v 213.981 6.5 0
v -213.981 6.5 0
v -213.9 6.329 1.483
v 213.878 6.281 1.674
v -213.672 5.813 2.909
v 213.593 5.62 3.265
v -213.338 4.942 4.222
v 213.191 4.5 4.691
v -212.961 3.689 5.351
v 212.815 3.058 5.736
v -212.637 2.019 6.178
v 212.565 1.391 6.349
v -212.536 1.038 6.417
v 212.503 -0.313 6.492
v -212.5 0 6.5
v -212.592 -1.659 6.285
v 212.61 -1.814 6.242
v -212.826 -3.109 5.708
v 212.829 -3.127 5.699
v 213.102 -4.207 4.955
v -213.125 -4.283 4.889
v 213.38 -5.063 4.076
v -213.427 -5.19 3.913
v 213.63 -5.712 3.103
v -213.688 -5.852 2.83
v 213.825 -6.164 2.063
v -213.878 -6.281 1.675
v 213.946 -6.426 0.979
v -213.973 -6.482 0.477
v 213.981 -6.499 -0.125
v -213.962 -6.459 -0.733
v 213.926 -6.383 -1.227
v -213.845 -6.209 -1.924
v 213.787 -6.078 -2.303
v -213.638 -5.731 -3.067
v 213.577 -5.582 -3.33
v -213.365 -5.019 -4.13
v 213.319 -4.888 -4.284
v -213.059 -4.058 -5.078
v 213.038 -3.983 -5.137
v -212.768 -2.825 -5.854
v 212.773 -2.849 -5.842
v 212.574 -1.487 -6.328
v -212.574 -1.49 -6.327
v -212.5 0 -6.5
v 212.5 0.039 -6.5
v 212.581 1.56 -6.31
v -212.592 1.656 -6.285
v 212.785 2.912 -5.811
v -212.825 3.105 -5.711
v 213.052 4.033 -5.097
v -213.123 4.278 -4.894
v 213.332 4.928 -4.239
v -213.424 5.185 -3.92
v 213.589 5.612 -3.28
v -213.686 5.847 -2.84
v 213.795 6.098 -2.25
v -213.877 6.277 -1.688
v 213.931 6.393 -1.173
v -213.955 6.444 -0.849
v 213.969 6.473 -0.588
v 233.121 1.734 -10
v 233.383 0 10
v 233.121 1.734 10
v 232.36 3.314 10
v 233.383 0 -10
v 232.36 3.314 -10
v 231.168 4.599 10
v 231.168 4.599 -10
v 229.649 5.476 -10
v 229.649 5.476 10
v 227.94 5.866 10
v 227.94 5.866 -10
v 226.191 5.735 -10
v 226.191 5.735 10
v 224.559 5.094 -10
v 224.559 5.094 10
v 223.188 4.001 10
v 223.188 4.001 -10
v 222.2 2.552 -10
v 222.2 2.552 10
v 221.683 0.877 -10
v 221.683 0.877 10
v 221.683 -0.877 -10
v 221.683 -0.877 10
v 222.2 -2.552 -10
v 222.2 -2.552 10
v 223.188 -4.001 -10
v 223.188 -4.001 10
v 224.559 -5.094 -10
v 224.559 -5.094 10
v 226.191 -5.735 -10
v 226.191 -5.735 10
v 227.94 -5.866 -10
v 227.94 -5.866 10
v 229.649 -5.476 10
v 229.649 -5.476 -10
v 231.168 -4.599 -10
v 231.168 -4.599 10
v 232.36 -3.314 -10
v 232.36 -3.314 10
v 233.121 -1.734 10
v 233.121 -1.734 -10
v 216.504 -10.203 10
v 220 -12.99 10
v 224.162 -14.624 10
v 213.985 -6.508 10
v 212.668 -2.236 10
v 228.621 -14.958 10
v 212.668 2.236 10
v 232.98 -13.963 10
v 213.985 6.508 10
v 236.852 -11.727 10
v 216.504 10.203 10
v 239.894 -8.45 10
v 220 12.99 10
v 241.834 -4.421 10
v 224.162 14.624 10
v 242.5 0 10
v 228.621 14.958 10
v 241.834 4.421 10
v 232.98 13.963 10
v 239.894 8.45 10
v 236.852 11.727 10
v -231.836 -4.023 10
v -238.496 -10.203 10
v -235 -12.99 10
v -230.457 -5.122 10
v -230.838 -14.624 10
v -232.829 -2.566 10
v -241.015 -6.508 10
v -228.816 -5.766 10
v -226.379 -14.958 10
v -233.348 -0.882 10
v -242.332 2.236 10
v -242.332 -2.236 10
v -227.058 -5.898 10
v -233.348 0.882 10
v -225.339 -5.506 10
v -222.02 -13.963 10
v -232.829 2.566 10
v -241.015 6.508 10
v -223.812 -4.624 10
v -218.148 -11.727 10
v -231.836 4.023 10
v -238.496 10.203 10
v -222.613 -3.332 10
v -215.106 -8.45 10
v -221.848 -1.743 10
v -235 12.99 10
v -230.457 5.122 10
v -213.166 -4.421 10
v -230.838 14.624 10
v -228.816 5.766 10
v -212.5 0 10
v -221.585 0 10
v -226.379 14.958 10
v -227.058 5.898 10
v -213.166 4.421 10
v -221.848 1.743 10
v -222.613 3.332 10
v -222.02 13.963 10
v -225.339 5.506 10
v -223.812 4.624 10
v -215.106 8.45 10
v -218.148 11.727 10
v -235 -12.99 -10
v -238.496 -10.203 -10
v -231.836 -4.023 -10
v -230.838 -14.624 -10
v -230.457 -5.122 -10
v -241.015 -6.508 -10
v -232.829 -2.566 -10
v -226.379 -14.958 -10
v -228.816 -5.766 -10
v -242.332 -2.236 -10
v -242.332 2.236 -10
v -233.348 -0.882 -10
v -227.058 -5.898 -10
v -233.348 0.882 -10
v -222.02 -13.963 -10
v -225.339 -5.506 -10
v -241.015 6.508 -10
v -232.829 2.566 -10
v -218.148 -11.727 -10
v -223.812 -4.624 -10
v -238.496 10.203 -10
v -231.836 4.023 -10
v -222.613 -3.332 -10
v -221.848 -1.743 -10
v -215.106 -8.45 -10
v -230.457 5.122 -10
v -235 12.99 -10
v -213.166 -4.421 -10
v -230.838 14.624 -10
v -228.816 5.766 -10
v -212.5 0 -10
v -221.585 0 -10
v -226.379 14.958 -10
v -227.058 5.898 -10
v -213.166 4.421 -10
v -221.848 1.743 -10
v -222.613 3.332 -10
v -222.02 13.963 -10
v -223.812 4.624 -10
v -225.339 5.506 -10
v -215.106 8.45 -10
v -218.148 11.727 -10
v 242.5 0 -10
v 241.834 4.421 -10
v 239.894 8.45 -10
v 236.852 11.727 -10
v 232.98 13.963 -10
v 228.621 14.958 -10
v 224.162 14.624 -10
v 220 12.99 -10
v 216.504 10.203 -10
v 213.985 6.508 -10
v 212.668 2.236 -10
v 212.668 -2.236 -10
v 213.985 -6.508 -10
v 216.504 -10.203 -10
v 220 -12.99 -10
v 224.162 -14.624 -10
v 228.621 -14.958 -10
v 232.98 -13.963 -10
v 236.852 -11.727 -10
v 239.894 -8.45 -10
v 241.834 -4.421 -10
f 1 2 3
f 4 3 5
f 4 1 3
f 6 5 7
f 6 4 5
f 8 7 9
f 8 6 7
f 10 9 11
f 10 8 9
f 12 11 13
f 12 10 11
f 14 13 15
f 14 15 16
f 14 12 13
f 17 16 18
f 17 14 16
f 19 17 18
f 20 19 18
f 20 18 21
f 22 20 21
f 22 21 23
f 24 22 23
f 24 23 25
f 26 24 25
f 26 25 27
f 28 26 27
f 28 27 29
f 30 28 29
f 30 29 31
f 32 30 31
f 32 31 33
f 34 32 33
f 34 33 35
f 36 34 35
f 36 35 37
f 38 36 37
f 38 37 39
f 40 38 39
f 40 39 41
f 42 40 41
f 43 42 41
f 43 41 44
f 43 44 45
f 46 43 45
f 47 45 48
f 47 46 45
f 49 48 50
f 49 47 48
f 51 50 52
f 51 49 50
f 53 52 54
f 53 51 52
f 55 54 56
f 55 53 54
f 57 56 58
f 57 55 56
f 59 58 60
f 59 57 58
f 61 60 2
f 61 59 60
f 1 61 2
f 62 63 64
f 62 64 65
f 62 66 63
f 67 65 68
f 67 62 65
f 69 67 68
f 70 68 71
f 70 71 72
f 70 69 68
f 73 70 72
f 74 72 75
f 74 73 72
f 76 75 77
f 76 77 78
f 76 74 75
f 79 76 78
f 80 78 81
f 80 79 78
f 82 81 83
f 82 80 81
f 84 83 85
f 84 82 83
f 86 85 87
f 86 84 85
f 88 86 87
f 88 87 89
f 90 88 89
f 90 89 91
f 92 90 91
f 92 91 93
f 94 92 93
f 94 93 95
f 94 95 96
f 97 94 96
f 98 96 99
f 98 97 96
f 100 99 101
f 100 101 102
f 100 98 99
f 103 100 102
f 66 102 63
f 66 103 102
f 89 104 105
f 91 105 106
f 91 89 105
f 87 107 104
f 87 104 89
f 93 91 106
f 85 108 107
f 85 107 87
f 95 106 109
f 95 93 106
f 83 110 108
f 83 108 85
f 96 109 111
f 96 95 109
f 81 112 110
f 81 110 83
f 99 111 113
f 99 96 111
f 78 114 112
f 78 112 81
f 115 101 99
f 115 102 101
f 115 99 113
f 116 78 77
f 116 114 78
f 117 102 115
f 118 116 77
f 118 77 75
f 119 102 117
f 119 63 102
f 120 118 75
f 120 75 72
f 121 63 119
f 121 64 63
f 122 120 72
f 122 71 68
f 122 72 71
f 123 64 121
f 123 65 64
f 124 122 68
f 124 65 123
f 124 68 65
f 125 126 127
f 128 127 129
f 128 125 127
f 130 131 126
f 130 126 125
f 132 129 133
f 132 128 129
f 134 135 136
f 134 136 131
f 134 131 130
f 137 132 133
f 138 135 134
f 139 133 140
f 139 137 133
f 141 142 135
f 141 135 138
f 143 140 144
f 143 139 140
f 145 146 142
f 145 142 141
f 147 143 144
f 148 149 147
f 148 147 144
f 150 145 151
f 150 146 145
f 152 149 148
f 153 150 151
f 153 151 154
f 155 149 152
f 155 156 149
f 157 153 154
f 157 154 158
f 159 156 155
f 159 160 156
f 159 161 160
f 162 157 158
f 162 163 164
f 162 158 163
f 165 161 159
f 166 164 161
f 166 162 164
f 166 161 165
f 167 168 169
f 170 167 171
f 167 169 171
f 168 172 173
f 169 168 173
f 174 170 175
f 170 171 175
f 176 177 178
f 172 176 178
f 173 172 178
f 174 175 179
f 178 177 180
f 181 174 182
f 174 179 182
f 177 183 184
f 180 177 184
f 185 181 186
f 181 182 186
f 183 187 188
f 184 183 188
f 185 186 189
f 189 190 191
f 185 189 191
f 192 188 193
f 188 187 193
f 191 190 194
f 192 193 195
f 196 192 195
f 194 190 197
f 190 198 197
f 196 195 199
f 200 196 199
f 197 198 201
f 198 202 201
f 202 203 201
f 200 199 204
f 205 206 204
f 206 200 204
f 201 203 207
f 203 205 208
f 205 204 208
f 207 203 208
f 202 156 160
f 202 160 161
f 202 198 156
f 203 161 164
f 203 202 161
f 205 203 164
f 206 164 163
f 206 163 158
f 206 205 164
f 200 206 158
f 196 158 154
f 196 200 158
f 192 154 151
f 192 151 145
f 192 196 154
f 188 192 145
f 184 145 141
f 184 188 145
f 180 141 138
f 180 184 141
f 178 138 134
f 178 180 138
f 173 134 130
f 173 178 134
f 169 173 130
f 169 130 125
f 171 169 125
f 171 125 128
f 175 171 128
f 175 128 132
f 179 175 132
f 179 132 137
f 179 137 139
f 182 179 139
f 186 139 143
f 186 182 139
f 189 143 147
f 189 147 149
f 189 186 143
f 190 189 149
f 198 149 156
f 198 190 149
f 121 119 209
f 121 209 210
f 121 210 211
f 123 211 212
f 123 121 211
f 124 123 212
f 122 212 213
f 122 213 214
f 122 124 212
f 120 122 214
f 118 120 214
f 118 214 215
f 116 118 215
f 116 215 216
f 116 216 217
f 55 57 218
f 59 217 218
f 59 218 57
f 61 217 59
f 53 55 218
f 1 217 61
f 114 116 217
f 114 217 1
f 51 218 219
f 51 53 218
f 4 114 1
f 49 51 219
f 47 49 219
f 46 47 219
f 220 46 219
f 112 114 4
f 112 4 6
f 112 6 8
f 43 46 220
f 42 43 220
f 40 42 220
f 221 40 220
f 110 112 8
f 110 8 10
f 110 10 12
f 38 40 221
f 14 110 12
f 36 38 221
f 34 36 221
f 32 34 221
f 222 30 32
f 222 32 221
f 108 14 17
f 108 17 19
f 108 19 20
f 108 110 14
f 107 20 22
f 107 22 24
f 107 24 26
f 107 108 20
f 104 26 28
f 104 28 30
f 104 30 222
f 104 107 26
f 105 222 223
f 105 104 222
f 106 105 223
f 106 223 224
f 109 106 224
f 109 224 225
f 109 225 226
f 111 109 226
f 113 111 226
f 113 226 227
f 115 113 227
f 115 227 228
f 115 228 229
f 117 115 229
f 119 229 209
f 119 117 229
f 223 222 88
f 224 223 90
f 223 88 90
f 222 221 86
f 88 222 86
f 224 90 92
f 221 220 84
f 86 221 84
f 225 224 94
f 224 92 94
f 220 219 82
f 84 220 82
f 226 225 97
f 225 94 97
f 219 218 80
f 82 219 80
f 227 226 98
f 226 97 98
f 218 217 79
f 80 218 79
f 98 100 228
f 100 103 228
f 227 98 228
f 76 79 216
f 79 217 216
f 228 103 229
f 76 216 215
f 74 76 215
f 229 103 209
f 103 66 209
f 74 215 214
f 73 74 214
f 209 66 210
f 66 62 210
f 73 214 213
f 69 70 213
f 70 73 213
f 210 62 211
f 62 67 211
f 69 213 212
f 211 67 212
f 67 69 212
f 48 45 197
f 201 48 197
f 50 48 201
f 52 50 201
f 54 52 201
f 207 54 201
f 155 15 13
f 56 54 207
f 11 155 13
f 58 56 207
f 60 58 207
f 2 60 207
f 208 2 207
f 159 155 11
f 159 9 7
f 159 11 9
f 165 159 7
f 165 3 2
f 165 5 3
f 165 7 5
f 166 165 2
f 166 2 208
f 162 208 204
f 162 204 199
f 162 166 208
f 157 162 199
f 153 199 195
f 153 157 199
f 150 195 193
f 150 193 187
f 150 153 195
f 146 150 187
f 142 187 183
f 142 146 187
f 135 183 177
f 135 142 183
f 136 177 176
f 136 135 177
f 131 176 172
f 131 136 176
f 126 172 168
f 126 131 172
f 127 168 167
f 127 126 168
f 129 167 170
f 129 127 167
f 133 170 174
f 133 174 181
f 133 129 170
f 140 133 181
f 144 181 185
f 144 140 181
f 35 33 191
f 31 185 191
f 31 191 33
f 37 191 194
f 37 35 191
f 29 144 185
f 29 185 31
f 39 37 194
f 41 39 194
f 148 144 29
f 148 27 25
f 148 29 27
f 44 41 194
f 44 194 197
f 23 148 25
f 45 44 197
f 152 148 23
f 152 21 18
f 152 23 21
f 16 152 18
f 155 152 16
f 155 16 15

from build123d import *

# Parameters (mm, degrees)
F0_R     = 15
F0_R_2   = 5.9145568826
F1_DEPTH = 10
F0_R_3   = 5.8825208245
F2_R     = 6.5
F3_DEPTH = 215.6834155321


with BuildPart() as f1:
    # F0 (on Top) → F1 (new body, symmetric)
    with BuildSketch(Plane.XY):
        with Locations((-227.5, 0)):
            Circle(F0_R)
        with Locations((-227.5, 0)):
            Circle(F0_R_2, mode=Mode.SUBTRACT)
    extrude(amount=F1_DEPTH, both=True)



with BuildPart() as f1b:
    # F0 (on Top) → F1, piece 2 (new body, symmetric)
    with BuildSketch(Plane.XY):
        with Locations((227.5, 0)):
            Circle(F0_R)
        with Locations((227.5, 0)):
            Circle(F0_R_3, mode=Mode.SUBTRACT)
    extrude(amount=F1_DEPTH, both=True)


with BuildPart() as f1_1:
    add(f1.part)

    add(f1b.part)  # F3 merges F1b
    # F2 (on Right) → F3 (join, symmetric)
    with BuildSketch(Plane.YZ):
        Circle(F2_R)
    extrude(amount=F3_DEPTH, both=True)


solid = f1_1.part
